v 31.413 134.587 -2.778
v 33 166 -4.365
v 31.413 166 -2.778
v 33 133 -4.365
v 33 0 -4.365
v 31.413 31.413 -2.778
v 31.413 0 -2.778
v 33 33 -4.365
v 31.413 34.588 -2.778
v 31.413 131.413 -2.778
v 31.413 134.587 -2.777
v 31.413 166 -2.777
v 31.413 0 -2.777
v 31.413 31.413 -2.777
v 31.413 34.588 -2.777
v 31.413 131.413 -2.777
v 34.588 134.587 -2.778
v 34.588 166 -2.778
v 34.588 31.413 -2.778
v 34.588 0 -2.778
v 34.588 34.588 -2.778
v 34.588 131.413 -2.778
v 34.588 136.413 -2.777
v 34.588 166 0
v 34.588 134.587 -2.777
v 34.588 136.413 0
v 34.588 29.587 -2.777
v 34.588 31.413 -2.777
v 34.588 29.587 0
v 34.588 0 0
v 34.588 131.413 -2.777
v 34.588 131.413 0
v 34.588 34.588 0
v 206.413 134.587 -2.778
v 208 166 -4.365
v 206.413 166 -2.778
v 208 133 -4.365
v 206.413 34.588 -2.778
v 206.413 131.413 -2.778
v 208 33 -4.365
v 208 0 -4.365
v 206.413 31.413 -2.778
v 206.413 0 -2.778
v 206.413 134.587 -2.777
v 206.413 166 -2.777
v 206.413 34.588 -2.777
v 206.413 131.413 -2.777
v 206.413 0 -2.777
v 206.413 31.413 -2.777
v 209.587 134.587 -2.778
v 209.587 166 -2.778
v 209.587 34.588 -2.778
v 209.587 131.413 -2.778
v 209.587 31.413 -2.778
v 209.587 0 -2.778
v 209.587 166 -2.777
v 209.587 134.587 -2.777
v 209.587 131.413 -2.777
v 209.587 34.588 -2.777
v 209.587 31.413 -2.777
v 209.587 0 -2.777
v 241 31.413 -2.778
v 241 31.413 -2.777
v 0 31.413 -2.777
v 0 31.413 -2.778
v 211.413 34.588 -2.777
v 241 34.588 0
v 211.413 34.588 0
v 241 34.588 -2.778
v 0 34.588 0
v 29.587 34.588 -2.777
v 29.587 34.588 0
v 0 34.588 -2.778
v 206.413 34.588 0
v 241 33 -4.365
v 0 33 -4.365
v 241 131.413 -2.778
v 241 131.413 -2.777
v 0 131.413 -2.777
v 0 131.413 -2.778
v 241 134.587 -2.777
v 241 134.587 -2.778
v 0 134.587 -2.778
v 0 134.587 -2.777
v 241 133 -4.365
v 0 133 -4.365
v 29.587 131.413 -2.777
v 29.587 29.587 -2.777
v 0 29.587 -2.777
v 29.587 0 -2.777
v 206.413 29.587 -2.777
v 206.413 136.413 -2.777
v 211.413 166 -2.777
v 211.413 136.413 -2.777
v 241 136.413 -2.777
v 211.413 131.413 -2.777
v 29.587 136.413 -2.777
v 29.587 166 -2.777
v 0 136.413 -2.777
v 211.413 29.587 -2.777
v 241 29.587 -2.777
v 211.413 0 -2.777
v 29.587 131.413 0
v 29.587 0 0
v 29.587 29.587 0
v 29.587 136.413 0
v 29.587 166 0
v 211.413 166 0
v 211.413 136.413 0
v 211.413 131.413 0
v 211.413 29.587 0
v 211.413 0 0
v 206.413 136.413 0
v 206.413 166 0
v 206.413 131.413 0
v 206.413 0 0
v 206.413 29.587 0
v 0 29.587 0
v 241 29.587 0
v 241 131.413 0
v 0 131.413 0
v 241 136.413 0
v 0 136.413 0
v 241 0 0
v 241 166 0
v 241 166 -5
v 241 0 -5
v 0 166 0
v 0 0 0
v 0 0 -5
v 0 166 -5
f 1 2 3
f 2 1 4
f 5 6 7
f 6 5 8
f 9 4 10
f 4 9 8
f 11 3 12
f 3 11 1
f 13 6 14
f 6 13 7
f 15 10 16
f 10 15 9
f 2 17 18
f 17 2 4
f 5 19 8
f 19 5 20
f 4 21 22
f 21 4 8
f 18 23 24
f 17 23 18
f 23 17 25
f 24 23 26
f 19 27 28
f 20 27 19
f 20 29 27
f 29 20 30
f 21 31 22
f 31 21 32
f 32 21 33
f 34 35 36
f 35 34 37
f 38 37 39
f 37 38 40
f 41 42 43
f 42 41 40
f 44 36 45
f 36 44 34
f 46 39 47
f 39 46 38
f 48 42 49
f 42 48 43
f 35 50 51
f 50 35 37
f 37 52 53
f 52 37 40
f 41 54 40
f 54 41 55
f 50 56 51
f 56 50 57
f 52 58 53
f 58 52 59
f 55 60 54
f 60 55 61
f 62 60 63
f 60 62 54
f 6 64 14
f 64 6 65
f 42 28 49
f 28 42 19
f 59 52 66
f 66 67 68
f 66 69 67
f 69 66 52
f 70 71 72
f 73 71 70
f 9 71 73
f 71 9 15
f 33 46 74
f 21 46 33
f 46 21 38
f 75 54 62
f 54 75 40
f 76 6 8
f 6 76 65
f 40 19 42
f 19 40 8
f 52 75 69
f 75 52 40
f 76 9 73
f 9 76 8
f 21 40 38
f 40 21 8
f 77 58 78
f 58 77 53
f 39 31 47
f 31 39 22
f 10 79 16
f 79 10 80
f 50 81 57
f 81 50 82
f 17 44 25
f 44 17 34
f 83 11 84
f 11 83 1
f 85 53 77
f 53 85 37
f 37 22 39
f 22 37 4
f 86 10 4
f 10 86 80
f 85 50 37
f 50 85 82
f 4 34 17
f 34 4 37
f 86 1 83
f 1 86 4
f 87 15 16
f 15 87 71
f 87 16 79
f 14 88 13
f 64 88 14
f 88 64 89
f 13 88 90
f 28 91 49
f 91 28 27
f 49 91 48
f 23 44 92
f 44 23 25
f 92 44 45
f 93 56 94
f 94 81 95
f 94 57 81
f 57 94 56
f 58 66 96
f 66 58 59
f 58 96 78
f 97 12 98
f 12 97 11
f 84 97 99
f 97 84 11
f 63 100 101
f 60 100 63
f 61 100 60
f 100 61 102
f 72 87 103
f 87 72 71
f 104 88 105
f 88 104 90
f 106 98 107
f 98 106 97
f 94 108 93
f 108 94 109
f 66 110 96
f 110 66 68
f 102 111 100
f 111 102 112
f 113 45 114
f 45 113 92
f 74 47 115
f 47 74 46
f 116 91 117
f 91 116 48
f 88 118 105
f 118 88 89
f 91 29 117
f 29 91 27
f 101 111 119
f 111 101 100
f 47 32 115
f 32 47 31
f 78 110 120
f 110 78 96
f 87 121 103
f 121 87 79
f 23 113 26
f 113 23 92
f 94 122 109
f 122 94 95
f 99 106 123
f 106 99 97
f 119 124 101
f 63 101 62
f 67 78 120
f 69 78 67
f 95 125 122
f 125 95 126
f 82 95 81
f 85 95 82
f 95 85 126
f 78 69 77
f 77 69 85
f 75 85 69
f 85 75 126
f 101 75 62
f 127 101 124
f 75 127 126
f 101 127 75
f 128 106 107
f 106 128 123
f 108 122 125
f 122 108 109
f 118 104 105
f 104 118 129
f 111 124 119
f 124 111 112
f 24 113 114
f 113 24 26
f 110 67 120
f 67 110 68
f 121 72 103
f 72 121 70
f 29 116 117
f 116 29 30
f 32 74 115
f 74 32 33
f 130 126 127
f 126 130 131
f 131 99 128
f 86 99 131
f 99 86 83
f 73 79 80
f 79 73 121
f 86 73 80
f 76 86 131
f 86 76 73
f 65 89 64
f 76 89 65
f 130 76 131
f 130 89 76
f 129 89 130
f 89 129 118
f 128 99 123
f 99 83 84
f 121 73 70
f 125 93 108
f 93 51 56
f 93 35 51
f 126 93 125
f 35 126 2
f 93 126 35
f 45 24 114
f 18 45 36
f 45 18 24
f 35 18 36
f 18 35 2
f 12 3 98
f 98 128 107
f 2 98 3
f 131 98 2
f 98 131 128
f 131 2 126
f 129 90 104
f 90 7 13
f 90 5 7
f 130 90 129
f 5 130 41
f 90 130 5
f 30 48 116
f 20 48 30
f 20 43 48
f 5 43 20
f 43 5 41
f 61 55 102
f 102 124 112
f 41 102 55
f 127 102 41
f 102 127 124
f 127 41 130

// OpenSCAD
//!OpenSCAD

BoxWidth = 175;
BoxDepth = 100;
BoxHeight = 33;
StockThickness = 5;
SkinThickness = 0.635;
VendmillDiameter = 3.175;
PocketEndmillDiameter = 6.35;
ExportVcuts = false;
ExportPocketCuts = false;

$fn = 360;

vendmillradius = VendmillDiameter / 2;
pocketendmillradius = PocketEndmillDiameter / 2;

module pocketcut(width, depth, xorigin, yorigin, xend, yend) {
  hull(){
    translate([xorigin, yorigin, (0 - depth)]){
      cube([width, width, StockThickness], center=false);
    }
    translate([xend, yend, (0 - depth)]){
      cube([width, width, StockThickness], center=false);
    }
  }
}

module vcut(diameter, depth, xorigin, yorigin, xend, yend) {
  radius = diameter / 2;
  hull(){
    translate([xorigin, yorigin, (0 - depth)]){
      union(){
        translate([0, 0, radius]){
          cylinder(r1=radius, r2=radius, h=StockThickness, center=false);
        }
        cylinder(r1=0, r2=radius, h=vendmillradius, center=false);
      }
    }
    translate([xend, yend, (0 - depth)]){
      union(){
        translate([0, 0, radius]){
          cylinder(r1=radius, r2=radius, h=StockThickness, center=false);
        }
        cylinder(r1=0, r2=radius, h=vendmillradius, center=false);
      }
    }
  }
}

module vcuts() {
  union(){
    vcut(VendmillDiameter, StockThickness - SkinThickness, BoxHeight, 0 - vendmillradius, BoxHeight, (BoxDepth + BoxHeight * 2) + 0);
    vcut(VendmillDiameter, StockThickness - SkinThickness, BoxHeight + BoxWidth, 0 - vendmillradius, BoxHeight + BoxWidth, (BoxDepth + BoxHeight * 2) + 0);
    vcut(VendmillDiameter, StockThickness - SkinThickness, 0 - vendmillradius, BoxHeight, (BoxWidth + BoxHeight * 2) + 0, BoxHeight);
    vcut(VendmillDiameter, StockThickness - SkinThickness, 0 - vendmillradius, BoxDepth + BoxHeight, BoxWidth + (BoxHeight * 2 + 0), BoxDepth + BoxHeight);
  }
}

module pocketcuts() {
  union(){
    pocketcut(StockThickness, StockThickness - (vendmillradius + SkinThickness), (BoxHeight - StockThickness) + vendmillradius, 0 - pocketendmillradius, (BoxHeight - StockThickness) + vendmillradius, (BoxDepth + BoxHeight * 2) - VendmillDiameter);
    pocketcut(StockThickness, StockThickness - (vendmillradius + SkinThickness), (BoxHeight + BoxWidth) - vendmillradius, 0 - pocketendmillradius, (BoxHeight + BoxWidth) - vendmillradius, (BoxDepth + BoxHeight * 2) - VendmillDiameter);
    pocketcut(StockThickness, StockThickness - (vendmillradius + SkinThickness), 0 - pocketendmillradius, (BoxHeight - StockThickness) + vendmillradius, (BoxWidth + BoxHeight * 2) - VendmillDiameter, (BoxHeight - StockThickness) + vendmillradius);
    pocketcut(StockThickness, StockThickness - (vendmillradius + SkinThickness), 0 - pocketendmillradius, (BoxHeight + BoxDepth) - vendmillradius, (BoxWidth + BoxHeight * 2) - VendmillDiameter, (BoxHeight + BoxDepth) - vendmillradius);
  }
}

if (ExportVcuts == true) {
  projection (cut = true) {vcuts();}
} else if (ExportPocketCuts == true) {
  projection (cut = true) {pocketcuts();}
} else {
  difference() {
    translate([0, 0, (0 - StockThickness)]){
      cube([(BoxWidth + BoxHeight * 2), (BoxDepth + BoxHeight * 2), StockThickness], center=false);
    }

    vcuts();
    pocketcuts();
  }
}
